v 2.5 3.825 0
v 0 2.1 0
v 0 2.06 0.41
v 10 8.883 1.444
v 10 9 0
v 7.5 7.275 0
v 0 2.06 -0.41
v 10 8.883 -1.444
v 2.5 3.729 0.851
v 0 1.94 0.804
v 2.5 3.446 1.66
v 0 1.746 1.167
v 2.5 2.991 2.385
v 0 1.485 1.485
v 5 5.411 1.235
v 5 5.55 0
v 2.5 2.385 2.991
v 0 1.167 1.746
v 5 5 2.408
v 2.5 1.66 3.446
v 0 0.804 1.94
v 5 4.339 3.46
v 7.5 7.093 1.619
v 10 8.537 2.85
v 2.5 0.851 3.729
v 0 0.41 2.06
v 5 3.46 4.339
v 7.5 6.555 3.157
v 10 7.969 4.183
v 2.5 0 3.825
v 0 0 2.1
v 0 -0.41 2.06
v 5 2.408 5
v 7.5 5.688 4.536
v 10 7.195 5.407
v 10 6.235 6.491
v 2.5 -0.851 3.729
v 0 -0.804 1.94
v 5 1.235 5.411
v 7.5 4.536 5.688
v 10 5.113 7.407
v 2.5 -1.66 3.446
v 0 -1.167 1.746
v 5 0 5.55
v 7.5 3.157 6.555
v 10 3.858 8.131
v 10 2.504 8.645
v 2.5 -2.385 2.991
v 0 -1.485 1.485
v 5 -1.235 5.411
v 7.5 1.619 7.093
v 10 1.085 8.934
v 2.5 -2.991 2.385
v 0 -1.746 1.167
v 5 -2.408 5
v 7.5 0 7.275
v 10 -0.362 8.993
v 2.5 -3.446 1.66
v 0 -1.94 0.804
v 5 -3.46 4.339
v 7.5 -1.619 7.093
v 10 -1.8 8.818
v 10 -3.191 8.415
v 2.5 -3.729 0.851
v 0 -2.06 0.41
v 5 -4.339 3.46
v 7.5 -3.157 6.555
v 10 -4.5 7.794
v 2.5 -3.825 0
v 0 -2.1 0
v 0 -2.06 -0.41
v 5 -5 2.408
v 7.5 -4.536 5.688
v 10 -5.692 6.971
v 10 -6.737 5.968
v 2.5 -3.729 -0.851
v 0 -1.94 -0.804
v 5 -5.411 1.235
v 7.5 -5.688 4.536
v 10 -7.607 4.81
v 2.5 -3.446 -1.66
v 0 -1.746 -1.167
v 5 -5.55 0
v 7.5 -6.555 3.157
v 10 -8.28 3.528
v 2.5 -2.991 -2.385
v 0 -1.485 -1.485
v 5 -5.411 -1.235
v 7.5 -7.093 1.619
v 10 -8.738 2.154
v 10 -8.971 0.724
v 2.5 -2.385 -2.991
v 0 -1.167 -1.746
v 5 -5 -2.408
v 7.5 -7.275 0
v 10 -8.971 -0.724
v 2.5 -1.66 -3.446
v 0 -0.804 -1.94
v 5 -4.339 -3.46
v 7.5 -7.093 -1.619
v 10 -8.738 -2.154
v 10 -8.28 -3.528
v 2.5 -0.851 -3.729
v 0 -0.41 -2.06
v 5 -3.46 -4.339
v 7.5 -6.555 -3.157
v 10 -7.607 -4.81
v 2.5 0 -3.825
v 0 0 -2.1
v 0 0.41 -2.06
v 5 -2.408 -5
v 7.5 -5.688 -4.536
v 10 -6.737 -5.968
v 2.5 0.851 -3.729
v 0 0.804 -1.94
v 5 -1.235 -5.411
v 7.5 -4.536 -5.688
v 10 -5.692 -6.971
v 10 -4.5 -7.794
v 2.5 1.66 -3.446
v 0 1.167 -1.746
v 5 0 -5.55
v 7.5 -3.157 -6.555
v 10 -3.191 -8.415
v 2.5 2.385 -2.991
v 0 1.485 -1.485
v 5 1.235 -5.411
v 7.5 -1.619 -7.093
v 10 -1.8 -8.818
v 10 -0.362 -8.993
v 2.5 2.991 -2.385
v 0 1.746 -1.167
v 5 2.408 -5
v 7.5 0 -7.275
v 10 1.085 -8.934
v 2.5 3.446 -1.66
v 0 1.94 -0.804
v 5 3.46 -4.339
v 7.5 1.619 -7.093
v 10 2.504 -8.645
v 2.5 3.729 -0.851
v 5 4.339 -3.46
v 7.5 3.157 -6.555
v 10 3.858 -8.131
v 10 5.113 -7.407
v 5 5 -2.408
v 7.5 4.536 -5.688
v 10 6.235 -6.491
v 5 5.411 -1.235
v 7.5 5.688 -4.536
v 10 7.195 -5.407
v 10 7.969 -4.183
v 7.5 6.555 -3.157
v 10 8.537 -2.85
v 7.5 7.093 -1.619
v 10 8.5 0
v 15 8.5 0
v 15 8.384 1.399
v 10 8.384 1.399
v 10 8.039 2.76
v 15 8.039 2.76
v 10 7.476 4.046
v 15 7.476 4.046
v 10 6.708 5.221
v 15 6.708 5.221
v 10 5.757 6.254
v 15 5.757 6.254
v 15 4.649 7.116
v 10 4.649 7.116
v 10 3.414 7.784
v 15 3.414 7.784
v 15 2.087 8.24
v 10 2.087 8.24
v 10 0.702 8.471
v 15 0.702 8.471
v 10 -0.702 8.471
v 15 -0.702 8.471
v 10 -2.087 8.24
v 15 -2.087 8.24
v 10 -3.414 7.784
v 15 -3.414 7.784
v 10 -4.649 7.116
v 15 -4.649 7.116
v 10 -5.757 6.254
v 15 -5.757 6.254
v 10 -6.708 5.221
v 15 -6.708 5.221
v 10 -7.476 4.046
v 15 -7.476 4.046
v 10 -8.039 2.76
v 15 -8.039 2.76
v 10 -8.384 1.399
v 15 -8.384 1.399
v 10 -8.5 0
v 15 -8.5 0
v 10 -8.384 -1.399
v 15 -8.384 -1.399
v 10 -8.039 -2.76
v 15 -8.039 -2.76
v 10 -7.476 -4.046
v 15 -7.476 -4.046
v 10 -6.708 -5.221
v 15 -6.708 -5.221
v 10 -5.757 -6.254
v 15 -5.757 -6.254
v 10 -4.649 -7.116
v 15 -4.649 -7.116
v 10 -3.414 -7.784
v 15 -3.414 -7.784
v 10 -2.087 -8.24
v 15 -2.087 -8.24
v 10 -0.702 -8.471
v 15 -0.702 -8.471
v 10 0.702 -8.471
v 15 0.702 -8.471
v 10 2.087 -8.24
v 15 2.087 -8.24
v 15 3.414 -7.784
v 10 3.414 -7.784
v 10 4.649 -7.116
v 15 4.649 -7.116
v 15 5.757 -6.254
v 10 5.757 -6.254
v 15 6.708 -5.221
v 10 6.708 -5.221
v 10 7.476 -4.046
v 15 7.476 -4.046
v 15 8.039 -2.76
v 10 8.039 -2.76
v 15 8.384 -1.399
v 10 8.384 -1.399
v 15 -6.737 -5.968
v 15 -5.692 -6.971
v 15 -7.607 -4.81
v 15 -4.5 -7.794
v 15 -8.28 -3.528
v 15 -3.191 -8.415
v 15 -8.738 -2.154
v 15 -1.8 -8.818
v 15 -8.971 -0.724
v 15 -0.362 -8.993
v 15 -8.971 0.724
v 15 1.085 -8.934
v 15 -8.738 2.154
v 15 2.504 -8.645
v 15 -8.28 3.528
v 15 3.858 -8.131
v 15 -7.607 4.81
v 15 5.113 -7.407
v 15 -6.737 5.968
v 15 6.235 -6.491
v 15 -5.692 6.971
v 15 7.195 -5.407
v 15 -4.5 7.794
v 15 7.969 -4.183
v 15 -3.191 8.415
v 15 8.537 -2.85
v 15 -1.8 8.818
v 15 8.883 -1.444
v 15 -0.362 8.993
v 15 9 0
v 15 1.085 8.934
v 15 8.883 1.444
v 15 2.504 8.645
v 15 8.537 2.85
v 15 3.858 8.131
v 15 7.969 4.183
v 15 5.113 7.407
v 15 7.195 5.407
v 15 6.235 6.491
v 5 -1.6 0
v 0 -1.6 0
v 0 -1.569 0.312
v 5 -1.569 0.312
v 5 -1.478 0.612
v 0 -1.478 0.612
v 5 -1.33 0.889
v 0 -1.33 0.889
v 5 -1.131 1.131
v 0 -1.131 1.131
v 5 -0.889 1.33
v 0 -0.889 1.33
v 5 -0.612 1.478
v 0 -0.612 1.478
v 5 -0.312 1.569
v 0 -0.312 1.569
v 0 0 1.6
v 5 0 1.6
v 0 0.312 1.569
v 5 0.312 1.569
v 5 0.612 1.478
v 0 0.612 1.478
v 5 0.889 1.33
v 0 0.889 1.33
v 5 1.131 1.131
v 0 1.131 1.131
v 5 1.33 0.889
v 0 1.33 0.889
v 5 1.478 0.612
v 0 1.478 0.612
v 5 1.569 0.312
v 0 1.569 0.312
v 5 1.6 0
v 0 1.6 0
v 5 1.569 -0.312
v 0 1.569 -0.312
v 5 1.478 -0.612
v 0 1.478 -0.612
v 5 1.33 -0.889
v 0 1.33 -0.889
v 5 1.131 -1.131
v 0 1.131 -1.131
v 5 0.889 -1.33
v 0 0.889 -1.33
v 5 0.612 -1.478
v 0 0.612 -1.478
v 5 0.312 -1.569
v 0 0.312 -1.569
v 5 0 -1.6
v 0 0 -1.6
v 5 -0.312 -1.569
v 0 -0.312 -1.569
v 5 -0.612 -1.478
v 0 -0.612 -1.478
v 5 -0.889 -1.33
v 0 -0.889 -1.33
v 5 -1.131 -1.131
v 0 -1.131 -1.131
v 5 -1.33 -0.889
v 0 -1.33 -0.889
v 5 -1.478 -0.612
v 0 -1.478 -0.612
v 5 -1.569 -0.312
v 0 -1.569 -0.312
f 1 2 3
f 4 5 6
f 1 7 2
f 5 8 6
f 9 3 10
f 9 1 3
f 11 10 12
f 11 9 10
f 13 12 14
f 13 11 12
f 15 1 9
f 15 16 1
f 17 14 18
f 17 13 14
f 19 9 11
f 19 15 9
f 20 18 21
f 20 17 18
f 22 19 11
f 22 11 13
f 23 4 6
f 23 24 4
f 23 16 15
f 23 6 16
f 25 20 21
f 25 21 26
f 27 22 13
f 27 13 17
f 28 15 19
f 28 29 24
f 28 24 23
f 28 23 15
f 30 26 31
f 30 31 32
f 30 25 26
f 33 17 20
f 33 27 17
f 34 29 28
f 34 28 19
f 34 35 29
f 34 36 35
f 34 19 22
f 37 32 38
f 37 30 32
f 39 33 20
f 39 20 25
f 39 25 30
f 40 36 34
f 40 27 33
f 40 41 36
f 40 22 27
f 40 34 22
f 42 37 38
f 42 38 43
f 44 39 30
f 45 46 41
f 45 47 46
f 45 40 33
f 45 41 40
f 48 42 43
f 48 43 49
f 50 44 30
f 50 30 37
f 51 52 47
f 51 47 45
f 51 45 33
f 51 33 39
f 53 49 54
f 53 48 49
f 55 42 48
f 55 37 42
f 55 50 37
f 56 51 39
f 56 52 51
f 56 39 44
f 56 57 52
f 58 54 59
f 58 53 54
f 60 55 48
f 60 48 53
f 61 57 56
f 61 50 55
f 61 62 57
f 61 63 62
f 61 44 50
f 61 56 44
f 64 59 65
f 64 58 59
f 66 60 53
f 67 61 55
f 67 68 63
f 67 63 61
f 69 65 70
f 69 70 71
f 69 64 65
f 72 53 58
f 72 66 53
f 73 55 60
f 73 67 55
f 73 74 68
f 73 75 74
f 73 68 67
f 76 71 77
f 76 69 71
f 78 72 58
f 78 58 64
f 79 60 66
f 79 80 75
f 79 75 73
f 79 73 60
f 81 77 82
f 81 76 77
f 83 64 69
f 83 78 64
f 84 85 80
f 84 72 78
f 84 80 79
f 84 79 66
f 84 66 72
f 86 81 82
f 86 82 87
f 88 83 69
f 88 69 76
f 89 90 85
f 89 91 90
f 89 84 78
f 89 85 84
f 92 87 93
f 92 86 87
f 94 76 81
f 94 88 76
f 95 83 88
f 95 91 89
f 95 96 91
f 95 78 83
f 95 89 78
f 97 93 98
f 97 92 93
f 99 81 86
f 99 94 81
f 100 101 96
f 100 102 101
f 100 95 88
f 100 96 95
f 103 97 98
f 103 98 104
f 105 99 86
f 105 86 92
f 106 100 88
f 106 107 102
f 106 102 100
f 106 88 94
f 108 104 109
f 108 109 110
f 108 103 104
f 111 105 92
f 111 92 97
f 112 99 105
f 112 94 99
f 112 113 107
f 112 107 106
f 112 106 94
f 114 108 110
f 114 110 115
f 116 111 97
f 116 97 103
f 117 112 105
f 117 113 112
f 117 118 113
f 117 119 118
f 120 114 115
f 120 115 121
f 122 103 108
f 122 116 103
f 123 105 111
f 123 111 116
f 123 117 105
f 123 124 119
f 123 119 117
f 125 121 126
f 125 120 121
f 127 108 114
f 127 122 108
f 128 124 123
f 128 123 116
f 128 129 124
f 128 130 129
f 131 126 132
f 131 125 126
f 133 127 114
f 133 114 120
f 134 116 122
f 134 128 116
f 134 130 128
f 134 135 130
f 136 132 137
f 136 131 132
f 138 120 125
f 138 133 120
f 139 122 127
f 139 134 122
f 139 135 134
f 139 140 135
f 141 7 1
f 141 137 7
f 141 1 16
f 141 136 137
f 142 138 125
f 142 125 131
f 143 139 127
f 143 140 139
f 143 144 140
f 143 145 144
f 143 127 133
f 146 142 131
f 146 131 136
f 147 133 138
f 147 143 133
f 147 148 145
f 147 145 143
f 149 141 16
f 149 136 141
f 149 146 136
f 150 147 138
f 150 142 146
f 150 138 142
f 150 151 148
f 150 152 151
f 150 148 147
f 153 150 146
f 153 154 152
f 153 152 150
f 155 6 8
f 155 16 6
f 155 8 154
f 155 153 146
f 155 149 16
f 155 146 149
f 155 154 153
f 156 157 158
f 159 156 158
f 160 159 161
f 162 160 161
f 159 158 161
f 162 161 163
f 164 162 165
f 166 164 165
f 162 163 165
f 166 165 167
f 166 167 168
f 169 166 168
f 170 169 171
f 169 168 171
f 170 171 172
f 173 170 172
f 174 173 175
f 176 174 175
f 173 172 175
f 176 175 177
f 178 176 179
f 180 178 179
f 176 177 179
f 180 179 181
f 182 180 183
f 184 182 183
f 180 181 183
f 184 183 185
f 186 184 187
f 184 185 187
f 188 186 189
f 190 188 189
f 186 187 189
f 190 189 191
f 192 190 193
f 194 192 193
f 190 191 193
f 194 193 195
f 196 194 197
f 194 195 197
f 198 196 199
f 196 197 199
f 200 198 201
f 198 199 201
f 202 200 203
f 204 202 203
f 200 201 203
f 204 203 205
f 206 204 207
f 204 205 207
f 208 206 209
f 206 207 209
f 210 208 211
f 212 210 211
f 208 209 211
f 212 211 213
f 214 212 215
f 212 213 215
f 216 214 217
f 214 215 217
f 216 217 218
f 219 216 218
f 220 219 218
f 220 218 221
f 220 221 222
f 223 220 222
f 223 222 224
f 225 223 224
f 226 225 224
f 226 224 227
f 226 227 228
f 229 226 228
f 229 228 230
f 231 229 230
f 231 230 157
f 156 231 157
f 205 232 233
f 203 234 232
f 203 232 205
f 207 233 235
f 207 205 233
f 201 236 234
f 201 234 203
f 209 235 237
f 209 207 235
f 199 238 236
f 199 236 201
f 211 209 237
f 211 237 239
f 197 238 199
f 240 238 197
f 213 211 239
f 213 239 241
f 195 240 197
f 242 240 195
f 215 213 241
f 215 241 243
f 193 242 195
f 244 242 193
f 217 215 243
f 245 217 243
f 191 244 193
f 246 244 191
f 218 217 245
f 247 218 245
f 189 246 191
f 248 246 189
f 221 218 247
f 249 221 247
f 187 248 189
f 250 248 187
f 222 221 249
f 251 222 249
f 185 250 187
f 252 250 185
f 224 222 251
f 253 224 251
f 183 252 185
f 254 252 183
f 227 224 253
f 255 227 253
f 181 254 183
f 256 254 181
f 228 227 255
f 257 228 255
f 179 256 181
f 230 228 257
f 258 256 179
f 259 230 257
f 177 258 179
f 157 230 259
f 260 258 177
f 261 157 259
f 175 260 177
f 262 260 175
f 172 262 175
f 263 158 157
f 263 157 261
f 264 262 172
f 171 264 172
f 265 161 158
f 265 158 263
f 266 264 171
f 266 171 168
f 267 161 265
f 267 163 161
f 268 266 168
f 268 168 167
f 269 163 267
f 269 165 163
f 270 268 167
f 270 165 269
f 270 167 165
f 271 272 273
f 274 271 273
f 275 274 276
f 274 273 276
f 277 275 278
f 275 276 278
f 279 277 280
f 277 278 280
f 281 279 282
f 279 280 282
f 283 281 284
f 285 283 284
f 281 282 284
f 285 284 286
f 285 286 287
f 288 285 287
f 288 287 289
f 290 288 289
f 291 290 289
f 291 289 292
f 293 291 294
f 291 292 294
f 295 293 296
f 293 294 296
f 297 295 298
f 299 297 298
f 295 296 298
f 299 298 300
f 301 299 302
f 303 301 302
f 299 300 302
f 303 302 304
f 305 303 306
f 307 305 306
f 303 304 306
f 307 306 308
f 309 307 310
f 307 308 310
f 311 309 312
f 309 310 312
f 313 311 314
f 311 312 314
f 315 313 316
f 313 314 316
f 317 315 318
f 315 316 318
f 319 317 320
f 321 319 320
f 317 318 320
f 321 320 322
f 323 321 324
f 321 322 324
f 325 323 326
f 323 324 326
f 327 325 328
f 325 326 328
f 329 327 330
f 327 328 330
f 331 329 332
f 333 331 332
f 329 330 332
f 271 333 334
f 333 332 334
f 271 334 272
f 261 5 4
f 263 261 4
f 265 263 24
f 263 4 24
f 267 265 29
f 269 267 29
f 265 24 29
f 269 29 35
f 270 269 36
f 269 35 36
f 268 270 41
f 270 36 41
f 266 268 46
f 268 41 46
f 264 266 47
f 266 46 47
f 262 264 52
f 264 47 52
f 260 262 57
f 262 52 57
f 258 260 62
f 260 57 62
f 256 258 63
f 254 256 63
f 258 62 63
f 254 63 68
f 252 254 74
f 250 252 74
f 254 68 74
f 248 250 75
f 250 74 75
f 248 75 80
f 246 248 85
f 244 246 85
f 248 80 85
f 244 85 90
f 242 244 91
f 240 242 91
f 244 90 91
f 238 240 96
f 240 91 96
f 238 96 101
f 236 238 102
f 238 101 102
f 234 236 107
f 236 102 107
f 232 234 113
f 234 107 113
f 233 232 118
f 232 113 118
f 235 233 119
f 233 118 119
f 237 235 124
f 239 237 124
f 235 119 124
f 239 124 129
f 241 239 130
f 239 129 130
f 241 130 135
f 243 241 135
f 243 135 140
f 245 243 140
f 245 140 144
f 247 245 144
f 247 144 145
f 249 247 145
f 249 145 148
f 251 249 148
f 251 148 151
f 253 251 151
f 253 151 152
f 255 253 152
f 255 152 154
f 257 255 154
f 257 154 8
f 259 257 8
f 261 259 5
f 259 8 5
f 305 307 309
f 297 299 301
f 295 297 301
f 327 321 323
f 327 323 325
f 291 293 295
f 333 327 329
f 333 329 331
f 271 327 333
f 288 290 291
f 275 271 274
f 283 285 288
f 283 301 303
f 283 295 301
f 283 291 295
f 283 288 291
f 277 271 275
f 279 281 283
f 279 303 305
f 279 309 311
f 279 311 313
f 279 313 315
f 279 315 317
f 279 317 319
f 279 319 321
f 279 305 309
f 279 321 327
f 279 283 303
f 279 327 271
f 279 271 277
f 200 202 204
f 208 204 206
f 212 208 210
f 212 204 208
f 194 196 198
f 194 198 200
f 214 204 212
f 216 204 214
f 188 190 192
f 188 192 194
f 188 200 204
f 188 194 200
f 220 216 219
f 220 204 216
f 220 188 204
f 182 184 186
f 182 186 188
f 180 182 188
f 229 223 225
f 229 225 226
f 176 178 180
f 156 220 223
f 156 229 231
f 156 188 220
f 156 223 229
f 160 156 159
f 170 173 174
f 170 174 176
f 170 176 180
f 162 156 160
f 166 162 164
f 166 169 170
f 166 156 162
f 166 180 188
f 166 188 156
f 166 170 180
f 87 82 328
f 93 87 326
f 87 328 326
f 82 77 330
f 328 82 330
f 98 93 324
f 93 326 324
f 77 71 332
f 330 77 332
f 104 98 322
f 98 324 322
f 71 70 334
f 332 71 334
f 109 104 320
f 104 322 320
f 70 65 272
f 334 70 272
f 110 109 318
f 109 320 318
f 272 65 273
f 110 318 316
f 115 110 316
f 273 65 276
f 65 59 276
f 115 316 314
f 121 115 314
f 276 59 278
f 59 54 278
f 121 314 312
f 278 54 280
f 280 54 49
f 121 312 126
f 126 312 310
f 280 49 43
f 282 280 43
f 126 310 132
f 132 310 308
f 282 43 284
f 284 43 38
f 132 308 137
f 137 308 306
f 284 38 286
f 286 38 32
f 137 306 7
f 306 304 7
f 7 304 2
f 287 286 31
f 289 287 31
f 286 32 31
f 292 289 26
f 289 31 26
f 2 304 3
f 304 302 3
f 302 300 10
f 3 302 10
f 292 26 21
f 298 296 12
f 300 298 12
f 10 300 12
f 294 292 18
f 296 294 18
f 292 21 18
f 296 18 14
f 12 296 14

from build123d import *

# Parameters (mm, degrees)
F0_R     = 2.1
F2_R     = 9
F4_R     = 1.6
F5_DEPTH = 5
F6_DEPTH = 5
F7_R     = 8.5
F8_DEPTH = 5


with BuildPart() as f3:
    # F0 (on Right) → F3 section 0
    with BuildSketch(Plane.YZ):
        Circle(F0_R)
    # F2 (on offset) → F3 section 1
    with BuildSketch(Plane.YZ.offset(10)):
        Circle(F2_R)
    loft()

    # F4 (on face) → F5 (cut)
    with BuildSketch(Plane(origin=(0, 0, 0), x_dir=(0, -1, 0), z_dir=(-1, 0, 0))):
        Circle(F4_R)
    extrude(amount=-F5_DEPTH, mode=Mode.SUBTRACT)

    # F2 (on offset) → F6 (join)
    with BuildSketch(Plane.YZ.offset(10)):
        Circle(F2_R)
    extrude(amount=F6_DEPTH)

    # F7 (on face) → F8 (cut)
    with BuildSketch(Plane.YZ.offset(15)):
        Circle(F7_R)
    extrude(amount=-F8_DEPTH, mode=Mode.SUBTRACT)


solid = f3.part
